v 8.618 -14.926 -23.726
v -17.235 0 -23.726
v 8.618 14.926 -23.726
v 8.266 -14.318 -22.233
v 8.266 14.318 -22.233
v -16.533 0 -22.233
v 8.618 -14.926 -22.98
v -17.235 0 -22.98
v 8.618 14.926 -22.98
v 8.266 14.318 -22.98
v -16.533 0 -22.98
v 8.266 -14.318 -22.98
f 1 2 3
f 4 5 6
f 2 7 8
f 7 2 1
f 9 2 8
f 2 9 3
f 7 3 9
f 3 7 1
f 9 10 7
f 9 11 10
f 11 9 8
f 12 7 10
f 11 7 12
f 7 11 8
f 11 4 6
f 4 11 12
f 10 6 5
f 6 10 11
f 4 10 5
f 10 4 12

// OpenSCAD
arete = 31.551;
angle = 20.905;
paroi = 1.5;
echelleReductionAjustementBouchon = 0.972;
r = 0.19; // résolution d'impression sur l'axe Z
ico_sch = [3,5];
Cpi = 3.14159;
Cphi = (1+sqrt(5))/2;
Cepsilon = 0.00000001;

function ico_ext_radius(a) = 
    a*1/4*(sqrt(10+2*sqrt(5)));
    
function ico_int_radius(a) = 
    a/12*(3*sqrt(3)+sqrt(15));
    
function ico_arete_from(int_radius) = 
    int_radius*12/(3*sqrt(3)+sqrt(15));
    
externalRadius = ico_ext_radius(arete);
internalRadius = ico_ext_radius( 
                    ico_arete_from(
                        ico_int_radius(arete)-paroi));
                        
echo(externalRadius); 
echo(internalRadius);

//ico_creux();
//decoupe_bouchon();
//corps_ouvert();
bouchon();
//trou();

module corps_ouvert() {
    //rotate([180, 0, 0])
	difference() {
		ico_creux();
		decoupe_bouchon();
	}
}

module bouchon(version) {
    rotate([180, 0, 0])
	scale([echelleReductionAjustementBouchon, echelleReductionAjustementBouchon, 0.995])
	difference () {
        intersection() {
            ico_creux();
            decoupe_bouchon(echelleReductionAjustementBouchon);
        }
        // trou centre face
//		translate([0, 0, externalRadius*0.5])
//		cylinder(30, r=diametreTrouBouchon/2, $fn=22);
	}
}

module trou() {
    rotate([0, -37.3, 0])
		translate([0, 0, externalRadius*0.5])
		cylinder(30, r=diametreTrouBouchon/2, $fn=22);
}

module ico_creux() {
	difference() {
        rotate([0, angle, 0]) icosahedron(externalRadius);
        rotate([0, angle, 0]) icosahedron(internalRadius);
	}
}

module decoupe_bouchon(scale=1) {
    distance = ico_int_radius(arete);
	rotate([0,0,60]) translate([0, 0, distance])
		cylinder(paroi, r=arete*0.562, $fn=3, center=true);
	rotate([0,0,60]) translate([0, 0, distance-paroi])
		cylinder(paroi, r=(arete-paroi)*0.566, $fn=3, center=true);
}

module icosahedron(rad=1) {
	Cphi = (1+sqrt(5))/2;

	// Convert spherical to cartesian
	function sph_to_cart(c, rad) = [
		rad*sin(atan2(sqrt(c[0]*c[0]+c[1]*c[1]), c[2]))*cos(atan2(c[1],c[0])),  
		rad*sin(atan2(sqrt(c[0]*c[0]+c[1]*c[1]), c[2]))*sin(atan2(c[1],c[0])),
		rad*cos(atan2(sqrt(c[0]*c[0]+c[1]*c[1]), c[2]))
		];


	//================================================
	//	Icosahedron
	//================================================
	//
	// (0, +-1, +-Cphi)
	// (+-Cphi, 0, +-1)
	// (+-1, +-Cphi, 0)

	function icosa_unit(rad) = [
		sph_to_cart([0, +1, +Cphi], rad), 
		sph_to_cart([0, +1, -Cphi], rad),
		sph_to_cart([0, -1, -Cphi], rad),
		sph_to_cart([0, -1, +Cphi], rad),
		sph_to_cart([+Cphi, 0, +1], rad), 
		sph_to_cart([+Cphi, 0, -1], rad), 
		sph_to_cart([-Cphi, 0, -1], rad),
		sph_to_cart([-Cphi, 0, +1], rad),
		sph_to_cart([+1, +Cphi, 0], rad),
		sph_to_cart([+1, -Cphi, 0], rad), 
		sph_to_cart([-1, -Cphi, 0], rad), 
		sph_to_cart([-1, +Cphi, 0], rad),
		];

	icosa_faces = [ 
		[3,0,4],
		[3,4,9],
		[3,9,10],
		[3,10,7],
		[3,7,0],
		[0,8,4],
		[0,7,11],
		[0,11,8],
		[4,8,5],
		[4,5,9],
		[7,10,6],
		[7,6,11],
		[9,5,2],
		[9,2,10],
		[2,6,10],
		[1,5,8],
		[1,8,11],
		[1,11,6],
		[5,1,2],
		[2,1,6]
		];

	polyhedron(icosa_unit(rad), faces = icosa_faces);
}
